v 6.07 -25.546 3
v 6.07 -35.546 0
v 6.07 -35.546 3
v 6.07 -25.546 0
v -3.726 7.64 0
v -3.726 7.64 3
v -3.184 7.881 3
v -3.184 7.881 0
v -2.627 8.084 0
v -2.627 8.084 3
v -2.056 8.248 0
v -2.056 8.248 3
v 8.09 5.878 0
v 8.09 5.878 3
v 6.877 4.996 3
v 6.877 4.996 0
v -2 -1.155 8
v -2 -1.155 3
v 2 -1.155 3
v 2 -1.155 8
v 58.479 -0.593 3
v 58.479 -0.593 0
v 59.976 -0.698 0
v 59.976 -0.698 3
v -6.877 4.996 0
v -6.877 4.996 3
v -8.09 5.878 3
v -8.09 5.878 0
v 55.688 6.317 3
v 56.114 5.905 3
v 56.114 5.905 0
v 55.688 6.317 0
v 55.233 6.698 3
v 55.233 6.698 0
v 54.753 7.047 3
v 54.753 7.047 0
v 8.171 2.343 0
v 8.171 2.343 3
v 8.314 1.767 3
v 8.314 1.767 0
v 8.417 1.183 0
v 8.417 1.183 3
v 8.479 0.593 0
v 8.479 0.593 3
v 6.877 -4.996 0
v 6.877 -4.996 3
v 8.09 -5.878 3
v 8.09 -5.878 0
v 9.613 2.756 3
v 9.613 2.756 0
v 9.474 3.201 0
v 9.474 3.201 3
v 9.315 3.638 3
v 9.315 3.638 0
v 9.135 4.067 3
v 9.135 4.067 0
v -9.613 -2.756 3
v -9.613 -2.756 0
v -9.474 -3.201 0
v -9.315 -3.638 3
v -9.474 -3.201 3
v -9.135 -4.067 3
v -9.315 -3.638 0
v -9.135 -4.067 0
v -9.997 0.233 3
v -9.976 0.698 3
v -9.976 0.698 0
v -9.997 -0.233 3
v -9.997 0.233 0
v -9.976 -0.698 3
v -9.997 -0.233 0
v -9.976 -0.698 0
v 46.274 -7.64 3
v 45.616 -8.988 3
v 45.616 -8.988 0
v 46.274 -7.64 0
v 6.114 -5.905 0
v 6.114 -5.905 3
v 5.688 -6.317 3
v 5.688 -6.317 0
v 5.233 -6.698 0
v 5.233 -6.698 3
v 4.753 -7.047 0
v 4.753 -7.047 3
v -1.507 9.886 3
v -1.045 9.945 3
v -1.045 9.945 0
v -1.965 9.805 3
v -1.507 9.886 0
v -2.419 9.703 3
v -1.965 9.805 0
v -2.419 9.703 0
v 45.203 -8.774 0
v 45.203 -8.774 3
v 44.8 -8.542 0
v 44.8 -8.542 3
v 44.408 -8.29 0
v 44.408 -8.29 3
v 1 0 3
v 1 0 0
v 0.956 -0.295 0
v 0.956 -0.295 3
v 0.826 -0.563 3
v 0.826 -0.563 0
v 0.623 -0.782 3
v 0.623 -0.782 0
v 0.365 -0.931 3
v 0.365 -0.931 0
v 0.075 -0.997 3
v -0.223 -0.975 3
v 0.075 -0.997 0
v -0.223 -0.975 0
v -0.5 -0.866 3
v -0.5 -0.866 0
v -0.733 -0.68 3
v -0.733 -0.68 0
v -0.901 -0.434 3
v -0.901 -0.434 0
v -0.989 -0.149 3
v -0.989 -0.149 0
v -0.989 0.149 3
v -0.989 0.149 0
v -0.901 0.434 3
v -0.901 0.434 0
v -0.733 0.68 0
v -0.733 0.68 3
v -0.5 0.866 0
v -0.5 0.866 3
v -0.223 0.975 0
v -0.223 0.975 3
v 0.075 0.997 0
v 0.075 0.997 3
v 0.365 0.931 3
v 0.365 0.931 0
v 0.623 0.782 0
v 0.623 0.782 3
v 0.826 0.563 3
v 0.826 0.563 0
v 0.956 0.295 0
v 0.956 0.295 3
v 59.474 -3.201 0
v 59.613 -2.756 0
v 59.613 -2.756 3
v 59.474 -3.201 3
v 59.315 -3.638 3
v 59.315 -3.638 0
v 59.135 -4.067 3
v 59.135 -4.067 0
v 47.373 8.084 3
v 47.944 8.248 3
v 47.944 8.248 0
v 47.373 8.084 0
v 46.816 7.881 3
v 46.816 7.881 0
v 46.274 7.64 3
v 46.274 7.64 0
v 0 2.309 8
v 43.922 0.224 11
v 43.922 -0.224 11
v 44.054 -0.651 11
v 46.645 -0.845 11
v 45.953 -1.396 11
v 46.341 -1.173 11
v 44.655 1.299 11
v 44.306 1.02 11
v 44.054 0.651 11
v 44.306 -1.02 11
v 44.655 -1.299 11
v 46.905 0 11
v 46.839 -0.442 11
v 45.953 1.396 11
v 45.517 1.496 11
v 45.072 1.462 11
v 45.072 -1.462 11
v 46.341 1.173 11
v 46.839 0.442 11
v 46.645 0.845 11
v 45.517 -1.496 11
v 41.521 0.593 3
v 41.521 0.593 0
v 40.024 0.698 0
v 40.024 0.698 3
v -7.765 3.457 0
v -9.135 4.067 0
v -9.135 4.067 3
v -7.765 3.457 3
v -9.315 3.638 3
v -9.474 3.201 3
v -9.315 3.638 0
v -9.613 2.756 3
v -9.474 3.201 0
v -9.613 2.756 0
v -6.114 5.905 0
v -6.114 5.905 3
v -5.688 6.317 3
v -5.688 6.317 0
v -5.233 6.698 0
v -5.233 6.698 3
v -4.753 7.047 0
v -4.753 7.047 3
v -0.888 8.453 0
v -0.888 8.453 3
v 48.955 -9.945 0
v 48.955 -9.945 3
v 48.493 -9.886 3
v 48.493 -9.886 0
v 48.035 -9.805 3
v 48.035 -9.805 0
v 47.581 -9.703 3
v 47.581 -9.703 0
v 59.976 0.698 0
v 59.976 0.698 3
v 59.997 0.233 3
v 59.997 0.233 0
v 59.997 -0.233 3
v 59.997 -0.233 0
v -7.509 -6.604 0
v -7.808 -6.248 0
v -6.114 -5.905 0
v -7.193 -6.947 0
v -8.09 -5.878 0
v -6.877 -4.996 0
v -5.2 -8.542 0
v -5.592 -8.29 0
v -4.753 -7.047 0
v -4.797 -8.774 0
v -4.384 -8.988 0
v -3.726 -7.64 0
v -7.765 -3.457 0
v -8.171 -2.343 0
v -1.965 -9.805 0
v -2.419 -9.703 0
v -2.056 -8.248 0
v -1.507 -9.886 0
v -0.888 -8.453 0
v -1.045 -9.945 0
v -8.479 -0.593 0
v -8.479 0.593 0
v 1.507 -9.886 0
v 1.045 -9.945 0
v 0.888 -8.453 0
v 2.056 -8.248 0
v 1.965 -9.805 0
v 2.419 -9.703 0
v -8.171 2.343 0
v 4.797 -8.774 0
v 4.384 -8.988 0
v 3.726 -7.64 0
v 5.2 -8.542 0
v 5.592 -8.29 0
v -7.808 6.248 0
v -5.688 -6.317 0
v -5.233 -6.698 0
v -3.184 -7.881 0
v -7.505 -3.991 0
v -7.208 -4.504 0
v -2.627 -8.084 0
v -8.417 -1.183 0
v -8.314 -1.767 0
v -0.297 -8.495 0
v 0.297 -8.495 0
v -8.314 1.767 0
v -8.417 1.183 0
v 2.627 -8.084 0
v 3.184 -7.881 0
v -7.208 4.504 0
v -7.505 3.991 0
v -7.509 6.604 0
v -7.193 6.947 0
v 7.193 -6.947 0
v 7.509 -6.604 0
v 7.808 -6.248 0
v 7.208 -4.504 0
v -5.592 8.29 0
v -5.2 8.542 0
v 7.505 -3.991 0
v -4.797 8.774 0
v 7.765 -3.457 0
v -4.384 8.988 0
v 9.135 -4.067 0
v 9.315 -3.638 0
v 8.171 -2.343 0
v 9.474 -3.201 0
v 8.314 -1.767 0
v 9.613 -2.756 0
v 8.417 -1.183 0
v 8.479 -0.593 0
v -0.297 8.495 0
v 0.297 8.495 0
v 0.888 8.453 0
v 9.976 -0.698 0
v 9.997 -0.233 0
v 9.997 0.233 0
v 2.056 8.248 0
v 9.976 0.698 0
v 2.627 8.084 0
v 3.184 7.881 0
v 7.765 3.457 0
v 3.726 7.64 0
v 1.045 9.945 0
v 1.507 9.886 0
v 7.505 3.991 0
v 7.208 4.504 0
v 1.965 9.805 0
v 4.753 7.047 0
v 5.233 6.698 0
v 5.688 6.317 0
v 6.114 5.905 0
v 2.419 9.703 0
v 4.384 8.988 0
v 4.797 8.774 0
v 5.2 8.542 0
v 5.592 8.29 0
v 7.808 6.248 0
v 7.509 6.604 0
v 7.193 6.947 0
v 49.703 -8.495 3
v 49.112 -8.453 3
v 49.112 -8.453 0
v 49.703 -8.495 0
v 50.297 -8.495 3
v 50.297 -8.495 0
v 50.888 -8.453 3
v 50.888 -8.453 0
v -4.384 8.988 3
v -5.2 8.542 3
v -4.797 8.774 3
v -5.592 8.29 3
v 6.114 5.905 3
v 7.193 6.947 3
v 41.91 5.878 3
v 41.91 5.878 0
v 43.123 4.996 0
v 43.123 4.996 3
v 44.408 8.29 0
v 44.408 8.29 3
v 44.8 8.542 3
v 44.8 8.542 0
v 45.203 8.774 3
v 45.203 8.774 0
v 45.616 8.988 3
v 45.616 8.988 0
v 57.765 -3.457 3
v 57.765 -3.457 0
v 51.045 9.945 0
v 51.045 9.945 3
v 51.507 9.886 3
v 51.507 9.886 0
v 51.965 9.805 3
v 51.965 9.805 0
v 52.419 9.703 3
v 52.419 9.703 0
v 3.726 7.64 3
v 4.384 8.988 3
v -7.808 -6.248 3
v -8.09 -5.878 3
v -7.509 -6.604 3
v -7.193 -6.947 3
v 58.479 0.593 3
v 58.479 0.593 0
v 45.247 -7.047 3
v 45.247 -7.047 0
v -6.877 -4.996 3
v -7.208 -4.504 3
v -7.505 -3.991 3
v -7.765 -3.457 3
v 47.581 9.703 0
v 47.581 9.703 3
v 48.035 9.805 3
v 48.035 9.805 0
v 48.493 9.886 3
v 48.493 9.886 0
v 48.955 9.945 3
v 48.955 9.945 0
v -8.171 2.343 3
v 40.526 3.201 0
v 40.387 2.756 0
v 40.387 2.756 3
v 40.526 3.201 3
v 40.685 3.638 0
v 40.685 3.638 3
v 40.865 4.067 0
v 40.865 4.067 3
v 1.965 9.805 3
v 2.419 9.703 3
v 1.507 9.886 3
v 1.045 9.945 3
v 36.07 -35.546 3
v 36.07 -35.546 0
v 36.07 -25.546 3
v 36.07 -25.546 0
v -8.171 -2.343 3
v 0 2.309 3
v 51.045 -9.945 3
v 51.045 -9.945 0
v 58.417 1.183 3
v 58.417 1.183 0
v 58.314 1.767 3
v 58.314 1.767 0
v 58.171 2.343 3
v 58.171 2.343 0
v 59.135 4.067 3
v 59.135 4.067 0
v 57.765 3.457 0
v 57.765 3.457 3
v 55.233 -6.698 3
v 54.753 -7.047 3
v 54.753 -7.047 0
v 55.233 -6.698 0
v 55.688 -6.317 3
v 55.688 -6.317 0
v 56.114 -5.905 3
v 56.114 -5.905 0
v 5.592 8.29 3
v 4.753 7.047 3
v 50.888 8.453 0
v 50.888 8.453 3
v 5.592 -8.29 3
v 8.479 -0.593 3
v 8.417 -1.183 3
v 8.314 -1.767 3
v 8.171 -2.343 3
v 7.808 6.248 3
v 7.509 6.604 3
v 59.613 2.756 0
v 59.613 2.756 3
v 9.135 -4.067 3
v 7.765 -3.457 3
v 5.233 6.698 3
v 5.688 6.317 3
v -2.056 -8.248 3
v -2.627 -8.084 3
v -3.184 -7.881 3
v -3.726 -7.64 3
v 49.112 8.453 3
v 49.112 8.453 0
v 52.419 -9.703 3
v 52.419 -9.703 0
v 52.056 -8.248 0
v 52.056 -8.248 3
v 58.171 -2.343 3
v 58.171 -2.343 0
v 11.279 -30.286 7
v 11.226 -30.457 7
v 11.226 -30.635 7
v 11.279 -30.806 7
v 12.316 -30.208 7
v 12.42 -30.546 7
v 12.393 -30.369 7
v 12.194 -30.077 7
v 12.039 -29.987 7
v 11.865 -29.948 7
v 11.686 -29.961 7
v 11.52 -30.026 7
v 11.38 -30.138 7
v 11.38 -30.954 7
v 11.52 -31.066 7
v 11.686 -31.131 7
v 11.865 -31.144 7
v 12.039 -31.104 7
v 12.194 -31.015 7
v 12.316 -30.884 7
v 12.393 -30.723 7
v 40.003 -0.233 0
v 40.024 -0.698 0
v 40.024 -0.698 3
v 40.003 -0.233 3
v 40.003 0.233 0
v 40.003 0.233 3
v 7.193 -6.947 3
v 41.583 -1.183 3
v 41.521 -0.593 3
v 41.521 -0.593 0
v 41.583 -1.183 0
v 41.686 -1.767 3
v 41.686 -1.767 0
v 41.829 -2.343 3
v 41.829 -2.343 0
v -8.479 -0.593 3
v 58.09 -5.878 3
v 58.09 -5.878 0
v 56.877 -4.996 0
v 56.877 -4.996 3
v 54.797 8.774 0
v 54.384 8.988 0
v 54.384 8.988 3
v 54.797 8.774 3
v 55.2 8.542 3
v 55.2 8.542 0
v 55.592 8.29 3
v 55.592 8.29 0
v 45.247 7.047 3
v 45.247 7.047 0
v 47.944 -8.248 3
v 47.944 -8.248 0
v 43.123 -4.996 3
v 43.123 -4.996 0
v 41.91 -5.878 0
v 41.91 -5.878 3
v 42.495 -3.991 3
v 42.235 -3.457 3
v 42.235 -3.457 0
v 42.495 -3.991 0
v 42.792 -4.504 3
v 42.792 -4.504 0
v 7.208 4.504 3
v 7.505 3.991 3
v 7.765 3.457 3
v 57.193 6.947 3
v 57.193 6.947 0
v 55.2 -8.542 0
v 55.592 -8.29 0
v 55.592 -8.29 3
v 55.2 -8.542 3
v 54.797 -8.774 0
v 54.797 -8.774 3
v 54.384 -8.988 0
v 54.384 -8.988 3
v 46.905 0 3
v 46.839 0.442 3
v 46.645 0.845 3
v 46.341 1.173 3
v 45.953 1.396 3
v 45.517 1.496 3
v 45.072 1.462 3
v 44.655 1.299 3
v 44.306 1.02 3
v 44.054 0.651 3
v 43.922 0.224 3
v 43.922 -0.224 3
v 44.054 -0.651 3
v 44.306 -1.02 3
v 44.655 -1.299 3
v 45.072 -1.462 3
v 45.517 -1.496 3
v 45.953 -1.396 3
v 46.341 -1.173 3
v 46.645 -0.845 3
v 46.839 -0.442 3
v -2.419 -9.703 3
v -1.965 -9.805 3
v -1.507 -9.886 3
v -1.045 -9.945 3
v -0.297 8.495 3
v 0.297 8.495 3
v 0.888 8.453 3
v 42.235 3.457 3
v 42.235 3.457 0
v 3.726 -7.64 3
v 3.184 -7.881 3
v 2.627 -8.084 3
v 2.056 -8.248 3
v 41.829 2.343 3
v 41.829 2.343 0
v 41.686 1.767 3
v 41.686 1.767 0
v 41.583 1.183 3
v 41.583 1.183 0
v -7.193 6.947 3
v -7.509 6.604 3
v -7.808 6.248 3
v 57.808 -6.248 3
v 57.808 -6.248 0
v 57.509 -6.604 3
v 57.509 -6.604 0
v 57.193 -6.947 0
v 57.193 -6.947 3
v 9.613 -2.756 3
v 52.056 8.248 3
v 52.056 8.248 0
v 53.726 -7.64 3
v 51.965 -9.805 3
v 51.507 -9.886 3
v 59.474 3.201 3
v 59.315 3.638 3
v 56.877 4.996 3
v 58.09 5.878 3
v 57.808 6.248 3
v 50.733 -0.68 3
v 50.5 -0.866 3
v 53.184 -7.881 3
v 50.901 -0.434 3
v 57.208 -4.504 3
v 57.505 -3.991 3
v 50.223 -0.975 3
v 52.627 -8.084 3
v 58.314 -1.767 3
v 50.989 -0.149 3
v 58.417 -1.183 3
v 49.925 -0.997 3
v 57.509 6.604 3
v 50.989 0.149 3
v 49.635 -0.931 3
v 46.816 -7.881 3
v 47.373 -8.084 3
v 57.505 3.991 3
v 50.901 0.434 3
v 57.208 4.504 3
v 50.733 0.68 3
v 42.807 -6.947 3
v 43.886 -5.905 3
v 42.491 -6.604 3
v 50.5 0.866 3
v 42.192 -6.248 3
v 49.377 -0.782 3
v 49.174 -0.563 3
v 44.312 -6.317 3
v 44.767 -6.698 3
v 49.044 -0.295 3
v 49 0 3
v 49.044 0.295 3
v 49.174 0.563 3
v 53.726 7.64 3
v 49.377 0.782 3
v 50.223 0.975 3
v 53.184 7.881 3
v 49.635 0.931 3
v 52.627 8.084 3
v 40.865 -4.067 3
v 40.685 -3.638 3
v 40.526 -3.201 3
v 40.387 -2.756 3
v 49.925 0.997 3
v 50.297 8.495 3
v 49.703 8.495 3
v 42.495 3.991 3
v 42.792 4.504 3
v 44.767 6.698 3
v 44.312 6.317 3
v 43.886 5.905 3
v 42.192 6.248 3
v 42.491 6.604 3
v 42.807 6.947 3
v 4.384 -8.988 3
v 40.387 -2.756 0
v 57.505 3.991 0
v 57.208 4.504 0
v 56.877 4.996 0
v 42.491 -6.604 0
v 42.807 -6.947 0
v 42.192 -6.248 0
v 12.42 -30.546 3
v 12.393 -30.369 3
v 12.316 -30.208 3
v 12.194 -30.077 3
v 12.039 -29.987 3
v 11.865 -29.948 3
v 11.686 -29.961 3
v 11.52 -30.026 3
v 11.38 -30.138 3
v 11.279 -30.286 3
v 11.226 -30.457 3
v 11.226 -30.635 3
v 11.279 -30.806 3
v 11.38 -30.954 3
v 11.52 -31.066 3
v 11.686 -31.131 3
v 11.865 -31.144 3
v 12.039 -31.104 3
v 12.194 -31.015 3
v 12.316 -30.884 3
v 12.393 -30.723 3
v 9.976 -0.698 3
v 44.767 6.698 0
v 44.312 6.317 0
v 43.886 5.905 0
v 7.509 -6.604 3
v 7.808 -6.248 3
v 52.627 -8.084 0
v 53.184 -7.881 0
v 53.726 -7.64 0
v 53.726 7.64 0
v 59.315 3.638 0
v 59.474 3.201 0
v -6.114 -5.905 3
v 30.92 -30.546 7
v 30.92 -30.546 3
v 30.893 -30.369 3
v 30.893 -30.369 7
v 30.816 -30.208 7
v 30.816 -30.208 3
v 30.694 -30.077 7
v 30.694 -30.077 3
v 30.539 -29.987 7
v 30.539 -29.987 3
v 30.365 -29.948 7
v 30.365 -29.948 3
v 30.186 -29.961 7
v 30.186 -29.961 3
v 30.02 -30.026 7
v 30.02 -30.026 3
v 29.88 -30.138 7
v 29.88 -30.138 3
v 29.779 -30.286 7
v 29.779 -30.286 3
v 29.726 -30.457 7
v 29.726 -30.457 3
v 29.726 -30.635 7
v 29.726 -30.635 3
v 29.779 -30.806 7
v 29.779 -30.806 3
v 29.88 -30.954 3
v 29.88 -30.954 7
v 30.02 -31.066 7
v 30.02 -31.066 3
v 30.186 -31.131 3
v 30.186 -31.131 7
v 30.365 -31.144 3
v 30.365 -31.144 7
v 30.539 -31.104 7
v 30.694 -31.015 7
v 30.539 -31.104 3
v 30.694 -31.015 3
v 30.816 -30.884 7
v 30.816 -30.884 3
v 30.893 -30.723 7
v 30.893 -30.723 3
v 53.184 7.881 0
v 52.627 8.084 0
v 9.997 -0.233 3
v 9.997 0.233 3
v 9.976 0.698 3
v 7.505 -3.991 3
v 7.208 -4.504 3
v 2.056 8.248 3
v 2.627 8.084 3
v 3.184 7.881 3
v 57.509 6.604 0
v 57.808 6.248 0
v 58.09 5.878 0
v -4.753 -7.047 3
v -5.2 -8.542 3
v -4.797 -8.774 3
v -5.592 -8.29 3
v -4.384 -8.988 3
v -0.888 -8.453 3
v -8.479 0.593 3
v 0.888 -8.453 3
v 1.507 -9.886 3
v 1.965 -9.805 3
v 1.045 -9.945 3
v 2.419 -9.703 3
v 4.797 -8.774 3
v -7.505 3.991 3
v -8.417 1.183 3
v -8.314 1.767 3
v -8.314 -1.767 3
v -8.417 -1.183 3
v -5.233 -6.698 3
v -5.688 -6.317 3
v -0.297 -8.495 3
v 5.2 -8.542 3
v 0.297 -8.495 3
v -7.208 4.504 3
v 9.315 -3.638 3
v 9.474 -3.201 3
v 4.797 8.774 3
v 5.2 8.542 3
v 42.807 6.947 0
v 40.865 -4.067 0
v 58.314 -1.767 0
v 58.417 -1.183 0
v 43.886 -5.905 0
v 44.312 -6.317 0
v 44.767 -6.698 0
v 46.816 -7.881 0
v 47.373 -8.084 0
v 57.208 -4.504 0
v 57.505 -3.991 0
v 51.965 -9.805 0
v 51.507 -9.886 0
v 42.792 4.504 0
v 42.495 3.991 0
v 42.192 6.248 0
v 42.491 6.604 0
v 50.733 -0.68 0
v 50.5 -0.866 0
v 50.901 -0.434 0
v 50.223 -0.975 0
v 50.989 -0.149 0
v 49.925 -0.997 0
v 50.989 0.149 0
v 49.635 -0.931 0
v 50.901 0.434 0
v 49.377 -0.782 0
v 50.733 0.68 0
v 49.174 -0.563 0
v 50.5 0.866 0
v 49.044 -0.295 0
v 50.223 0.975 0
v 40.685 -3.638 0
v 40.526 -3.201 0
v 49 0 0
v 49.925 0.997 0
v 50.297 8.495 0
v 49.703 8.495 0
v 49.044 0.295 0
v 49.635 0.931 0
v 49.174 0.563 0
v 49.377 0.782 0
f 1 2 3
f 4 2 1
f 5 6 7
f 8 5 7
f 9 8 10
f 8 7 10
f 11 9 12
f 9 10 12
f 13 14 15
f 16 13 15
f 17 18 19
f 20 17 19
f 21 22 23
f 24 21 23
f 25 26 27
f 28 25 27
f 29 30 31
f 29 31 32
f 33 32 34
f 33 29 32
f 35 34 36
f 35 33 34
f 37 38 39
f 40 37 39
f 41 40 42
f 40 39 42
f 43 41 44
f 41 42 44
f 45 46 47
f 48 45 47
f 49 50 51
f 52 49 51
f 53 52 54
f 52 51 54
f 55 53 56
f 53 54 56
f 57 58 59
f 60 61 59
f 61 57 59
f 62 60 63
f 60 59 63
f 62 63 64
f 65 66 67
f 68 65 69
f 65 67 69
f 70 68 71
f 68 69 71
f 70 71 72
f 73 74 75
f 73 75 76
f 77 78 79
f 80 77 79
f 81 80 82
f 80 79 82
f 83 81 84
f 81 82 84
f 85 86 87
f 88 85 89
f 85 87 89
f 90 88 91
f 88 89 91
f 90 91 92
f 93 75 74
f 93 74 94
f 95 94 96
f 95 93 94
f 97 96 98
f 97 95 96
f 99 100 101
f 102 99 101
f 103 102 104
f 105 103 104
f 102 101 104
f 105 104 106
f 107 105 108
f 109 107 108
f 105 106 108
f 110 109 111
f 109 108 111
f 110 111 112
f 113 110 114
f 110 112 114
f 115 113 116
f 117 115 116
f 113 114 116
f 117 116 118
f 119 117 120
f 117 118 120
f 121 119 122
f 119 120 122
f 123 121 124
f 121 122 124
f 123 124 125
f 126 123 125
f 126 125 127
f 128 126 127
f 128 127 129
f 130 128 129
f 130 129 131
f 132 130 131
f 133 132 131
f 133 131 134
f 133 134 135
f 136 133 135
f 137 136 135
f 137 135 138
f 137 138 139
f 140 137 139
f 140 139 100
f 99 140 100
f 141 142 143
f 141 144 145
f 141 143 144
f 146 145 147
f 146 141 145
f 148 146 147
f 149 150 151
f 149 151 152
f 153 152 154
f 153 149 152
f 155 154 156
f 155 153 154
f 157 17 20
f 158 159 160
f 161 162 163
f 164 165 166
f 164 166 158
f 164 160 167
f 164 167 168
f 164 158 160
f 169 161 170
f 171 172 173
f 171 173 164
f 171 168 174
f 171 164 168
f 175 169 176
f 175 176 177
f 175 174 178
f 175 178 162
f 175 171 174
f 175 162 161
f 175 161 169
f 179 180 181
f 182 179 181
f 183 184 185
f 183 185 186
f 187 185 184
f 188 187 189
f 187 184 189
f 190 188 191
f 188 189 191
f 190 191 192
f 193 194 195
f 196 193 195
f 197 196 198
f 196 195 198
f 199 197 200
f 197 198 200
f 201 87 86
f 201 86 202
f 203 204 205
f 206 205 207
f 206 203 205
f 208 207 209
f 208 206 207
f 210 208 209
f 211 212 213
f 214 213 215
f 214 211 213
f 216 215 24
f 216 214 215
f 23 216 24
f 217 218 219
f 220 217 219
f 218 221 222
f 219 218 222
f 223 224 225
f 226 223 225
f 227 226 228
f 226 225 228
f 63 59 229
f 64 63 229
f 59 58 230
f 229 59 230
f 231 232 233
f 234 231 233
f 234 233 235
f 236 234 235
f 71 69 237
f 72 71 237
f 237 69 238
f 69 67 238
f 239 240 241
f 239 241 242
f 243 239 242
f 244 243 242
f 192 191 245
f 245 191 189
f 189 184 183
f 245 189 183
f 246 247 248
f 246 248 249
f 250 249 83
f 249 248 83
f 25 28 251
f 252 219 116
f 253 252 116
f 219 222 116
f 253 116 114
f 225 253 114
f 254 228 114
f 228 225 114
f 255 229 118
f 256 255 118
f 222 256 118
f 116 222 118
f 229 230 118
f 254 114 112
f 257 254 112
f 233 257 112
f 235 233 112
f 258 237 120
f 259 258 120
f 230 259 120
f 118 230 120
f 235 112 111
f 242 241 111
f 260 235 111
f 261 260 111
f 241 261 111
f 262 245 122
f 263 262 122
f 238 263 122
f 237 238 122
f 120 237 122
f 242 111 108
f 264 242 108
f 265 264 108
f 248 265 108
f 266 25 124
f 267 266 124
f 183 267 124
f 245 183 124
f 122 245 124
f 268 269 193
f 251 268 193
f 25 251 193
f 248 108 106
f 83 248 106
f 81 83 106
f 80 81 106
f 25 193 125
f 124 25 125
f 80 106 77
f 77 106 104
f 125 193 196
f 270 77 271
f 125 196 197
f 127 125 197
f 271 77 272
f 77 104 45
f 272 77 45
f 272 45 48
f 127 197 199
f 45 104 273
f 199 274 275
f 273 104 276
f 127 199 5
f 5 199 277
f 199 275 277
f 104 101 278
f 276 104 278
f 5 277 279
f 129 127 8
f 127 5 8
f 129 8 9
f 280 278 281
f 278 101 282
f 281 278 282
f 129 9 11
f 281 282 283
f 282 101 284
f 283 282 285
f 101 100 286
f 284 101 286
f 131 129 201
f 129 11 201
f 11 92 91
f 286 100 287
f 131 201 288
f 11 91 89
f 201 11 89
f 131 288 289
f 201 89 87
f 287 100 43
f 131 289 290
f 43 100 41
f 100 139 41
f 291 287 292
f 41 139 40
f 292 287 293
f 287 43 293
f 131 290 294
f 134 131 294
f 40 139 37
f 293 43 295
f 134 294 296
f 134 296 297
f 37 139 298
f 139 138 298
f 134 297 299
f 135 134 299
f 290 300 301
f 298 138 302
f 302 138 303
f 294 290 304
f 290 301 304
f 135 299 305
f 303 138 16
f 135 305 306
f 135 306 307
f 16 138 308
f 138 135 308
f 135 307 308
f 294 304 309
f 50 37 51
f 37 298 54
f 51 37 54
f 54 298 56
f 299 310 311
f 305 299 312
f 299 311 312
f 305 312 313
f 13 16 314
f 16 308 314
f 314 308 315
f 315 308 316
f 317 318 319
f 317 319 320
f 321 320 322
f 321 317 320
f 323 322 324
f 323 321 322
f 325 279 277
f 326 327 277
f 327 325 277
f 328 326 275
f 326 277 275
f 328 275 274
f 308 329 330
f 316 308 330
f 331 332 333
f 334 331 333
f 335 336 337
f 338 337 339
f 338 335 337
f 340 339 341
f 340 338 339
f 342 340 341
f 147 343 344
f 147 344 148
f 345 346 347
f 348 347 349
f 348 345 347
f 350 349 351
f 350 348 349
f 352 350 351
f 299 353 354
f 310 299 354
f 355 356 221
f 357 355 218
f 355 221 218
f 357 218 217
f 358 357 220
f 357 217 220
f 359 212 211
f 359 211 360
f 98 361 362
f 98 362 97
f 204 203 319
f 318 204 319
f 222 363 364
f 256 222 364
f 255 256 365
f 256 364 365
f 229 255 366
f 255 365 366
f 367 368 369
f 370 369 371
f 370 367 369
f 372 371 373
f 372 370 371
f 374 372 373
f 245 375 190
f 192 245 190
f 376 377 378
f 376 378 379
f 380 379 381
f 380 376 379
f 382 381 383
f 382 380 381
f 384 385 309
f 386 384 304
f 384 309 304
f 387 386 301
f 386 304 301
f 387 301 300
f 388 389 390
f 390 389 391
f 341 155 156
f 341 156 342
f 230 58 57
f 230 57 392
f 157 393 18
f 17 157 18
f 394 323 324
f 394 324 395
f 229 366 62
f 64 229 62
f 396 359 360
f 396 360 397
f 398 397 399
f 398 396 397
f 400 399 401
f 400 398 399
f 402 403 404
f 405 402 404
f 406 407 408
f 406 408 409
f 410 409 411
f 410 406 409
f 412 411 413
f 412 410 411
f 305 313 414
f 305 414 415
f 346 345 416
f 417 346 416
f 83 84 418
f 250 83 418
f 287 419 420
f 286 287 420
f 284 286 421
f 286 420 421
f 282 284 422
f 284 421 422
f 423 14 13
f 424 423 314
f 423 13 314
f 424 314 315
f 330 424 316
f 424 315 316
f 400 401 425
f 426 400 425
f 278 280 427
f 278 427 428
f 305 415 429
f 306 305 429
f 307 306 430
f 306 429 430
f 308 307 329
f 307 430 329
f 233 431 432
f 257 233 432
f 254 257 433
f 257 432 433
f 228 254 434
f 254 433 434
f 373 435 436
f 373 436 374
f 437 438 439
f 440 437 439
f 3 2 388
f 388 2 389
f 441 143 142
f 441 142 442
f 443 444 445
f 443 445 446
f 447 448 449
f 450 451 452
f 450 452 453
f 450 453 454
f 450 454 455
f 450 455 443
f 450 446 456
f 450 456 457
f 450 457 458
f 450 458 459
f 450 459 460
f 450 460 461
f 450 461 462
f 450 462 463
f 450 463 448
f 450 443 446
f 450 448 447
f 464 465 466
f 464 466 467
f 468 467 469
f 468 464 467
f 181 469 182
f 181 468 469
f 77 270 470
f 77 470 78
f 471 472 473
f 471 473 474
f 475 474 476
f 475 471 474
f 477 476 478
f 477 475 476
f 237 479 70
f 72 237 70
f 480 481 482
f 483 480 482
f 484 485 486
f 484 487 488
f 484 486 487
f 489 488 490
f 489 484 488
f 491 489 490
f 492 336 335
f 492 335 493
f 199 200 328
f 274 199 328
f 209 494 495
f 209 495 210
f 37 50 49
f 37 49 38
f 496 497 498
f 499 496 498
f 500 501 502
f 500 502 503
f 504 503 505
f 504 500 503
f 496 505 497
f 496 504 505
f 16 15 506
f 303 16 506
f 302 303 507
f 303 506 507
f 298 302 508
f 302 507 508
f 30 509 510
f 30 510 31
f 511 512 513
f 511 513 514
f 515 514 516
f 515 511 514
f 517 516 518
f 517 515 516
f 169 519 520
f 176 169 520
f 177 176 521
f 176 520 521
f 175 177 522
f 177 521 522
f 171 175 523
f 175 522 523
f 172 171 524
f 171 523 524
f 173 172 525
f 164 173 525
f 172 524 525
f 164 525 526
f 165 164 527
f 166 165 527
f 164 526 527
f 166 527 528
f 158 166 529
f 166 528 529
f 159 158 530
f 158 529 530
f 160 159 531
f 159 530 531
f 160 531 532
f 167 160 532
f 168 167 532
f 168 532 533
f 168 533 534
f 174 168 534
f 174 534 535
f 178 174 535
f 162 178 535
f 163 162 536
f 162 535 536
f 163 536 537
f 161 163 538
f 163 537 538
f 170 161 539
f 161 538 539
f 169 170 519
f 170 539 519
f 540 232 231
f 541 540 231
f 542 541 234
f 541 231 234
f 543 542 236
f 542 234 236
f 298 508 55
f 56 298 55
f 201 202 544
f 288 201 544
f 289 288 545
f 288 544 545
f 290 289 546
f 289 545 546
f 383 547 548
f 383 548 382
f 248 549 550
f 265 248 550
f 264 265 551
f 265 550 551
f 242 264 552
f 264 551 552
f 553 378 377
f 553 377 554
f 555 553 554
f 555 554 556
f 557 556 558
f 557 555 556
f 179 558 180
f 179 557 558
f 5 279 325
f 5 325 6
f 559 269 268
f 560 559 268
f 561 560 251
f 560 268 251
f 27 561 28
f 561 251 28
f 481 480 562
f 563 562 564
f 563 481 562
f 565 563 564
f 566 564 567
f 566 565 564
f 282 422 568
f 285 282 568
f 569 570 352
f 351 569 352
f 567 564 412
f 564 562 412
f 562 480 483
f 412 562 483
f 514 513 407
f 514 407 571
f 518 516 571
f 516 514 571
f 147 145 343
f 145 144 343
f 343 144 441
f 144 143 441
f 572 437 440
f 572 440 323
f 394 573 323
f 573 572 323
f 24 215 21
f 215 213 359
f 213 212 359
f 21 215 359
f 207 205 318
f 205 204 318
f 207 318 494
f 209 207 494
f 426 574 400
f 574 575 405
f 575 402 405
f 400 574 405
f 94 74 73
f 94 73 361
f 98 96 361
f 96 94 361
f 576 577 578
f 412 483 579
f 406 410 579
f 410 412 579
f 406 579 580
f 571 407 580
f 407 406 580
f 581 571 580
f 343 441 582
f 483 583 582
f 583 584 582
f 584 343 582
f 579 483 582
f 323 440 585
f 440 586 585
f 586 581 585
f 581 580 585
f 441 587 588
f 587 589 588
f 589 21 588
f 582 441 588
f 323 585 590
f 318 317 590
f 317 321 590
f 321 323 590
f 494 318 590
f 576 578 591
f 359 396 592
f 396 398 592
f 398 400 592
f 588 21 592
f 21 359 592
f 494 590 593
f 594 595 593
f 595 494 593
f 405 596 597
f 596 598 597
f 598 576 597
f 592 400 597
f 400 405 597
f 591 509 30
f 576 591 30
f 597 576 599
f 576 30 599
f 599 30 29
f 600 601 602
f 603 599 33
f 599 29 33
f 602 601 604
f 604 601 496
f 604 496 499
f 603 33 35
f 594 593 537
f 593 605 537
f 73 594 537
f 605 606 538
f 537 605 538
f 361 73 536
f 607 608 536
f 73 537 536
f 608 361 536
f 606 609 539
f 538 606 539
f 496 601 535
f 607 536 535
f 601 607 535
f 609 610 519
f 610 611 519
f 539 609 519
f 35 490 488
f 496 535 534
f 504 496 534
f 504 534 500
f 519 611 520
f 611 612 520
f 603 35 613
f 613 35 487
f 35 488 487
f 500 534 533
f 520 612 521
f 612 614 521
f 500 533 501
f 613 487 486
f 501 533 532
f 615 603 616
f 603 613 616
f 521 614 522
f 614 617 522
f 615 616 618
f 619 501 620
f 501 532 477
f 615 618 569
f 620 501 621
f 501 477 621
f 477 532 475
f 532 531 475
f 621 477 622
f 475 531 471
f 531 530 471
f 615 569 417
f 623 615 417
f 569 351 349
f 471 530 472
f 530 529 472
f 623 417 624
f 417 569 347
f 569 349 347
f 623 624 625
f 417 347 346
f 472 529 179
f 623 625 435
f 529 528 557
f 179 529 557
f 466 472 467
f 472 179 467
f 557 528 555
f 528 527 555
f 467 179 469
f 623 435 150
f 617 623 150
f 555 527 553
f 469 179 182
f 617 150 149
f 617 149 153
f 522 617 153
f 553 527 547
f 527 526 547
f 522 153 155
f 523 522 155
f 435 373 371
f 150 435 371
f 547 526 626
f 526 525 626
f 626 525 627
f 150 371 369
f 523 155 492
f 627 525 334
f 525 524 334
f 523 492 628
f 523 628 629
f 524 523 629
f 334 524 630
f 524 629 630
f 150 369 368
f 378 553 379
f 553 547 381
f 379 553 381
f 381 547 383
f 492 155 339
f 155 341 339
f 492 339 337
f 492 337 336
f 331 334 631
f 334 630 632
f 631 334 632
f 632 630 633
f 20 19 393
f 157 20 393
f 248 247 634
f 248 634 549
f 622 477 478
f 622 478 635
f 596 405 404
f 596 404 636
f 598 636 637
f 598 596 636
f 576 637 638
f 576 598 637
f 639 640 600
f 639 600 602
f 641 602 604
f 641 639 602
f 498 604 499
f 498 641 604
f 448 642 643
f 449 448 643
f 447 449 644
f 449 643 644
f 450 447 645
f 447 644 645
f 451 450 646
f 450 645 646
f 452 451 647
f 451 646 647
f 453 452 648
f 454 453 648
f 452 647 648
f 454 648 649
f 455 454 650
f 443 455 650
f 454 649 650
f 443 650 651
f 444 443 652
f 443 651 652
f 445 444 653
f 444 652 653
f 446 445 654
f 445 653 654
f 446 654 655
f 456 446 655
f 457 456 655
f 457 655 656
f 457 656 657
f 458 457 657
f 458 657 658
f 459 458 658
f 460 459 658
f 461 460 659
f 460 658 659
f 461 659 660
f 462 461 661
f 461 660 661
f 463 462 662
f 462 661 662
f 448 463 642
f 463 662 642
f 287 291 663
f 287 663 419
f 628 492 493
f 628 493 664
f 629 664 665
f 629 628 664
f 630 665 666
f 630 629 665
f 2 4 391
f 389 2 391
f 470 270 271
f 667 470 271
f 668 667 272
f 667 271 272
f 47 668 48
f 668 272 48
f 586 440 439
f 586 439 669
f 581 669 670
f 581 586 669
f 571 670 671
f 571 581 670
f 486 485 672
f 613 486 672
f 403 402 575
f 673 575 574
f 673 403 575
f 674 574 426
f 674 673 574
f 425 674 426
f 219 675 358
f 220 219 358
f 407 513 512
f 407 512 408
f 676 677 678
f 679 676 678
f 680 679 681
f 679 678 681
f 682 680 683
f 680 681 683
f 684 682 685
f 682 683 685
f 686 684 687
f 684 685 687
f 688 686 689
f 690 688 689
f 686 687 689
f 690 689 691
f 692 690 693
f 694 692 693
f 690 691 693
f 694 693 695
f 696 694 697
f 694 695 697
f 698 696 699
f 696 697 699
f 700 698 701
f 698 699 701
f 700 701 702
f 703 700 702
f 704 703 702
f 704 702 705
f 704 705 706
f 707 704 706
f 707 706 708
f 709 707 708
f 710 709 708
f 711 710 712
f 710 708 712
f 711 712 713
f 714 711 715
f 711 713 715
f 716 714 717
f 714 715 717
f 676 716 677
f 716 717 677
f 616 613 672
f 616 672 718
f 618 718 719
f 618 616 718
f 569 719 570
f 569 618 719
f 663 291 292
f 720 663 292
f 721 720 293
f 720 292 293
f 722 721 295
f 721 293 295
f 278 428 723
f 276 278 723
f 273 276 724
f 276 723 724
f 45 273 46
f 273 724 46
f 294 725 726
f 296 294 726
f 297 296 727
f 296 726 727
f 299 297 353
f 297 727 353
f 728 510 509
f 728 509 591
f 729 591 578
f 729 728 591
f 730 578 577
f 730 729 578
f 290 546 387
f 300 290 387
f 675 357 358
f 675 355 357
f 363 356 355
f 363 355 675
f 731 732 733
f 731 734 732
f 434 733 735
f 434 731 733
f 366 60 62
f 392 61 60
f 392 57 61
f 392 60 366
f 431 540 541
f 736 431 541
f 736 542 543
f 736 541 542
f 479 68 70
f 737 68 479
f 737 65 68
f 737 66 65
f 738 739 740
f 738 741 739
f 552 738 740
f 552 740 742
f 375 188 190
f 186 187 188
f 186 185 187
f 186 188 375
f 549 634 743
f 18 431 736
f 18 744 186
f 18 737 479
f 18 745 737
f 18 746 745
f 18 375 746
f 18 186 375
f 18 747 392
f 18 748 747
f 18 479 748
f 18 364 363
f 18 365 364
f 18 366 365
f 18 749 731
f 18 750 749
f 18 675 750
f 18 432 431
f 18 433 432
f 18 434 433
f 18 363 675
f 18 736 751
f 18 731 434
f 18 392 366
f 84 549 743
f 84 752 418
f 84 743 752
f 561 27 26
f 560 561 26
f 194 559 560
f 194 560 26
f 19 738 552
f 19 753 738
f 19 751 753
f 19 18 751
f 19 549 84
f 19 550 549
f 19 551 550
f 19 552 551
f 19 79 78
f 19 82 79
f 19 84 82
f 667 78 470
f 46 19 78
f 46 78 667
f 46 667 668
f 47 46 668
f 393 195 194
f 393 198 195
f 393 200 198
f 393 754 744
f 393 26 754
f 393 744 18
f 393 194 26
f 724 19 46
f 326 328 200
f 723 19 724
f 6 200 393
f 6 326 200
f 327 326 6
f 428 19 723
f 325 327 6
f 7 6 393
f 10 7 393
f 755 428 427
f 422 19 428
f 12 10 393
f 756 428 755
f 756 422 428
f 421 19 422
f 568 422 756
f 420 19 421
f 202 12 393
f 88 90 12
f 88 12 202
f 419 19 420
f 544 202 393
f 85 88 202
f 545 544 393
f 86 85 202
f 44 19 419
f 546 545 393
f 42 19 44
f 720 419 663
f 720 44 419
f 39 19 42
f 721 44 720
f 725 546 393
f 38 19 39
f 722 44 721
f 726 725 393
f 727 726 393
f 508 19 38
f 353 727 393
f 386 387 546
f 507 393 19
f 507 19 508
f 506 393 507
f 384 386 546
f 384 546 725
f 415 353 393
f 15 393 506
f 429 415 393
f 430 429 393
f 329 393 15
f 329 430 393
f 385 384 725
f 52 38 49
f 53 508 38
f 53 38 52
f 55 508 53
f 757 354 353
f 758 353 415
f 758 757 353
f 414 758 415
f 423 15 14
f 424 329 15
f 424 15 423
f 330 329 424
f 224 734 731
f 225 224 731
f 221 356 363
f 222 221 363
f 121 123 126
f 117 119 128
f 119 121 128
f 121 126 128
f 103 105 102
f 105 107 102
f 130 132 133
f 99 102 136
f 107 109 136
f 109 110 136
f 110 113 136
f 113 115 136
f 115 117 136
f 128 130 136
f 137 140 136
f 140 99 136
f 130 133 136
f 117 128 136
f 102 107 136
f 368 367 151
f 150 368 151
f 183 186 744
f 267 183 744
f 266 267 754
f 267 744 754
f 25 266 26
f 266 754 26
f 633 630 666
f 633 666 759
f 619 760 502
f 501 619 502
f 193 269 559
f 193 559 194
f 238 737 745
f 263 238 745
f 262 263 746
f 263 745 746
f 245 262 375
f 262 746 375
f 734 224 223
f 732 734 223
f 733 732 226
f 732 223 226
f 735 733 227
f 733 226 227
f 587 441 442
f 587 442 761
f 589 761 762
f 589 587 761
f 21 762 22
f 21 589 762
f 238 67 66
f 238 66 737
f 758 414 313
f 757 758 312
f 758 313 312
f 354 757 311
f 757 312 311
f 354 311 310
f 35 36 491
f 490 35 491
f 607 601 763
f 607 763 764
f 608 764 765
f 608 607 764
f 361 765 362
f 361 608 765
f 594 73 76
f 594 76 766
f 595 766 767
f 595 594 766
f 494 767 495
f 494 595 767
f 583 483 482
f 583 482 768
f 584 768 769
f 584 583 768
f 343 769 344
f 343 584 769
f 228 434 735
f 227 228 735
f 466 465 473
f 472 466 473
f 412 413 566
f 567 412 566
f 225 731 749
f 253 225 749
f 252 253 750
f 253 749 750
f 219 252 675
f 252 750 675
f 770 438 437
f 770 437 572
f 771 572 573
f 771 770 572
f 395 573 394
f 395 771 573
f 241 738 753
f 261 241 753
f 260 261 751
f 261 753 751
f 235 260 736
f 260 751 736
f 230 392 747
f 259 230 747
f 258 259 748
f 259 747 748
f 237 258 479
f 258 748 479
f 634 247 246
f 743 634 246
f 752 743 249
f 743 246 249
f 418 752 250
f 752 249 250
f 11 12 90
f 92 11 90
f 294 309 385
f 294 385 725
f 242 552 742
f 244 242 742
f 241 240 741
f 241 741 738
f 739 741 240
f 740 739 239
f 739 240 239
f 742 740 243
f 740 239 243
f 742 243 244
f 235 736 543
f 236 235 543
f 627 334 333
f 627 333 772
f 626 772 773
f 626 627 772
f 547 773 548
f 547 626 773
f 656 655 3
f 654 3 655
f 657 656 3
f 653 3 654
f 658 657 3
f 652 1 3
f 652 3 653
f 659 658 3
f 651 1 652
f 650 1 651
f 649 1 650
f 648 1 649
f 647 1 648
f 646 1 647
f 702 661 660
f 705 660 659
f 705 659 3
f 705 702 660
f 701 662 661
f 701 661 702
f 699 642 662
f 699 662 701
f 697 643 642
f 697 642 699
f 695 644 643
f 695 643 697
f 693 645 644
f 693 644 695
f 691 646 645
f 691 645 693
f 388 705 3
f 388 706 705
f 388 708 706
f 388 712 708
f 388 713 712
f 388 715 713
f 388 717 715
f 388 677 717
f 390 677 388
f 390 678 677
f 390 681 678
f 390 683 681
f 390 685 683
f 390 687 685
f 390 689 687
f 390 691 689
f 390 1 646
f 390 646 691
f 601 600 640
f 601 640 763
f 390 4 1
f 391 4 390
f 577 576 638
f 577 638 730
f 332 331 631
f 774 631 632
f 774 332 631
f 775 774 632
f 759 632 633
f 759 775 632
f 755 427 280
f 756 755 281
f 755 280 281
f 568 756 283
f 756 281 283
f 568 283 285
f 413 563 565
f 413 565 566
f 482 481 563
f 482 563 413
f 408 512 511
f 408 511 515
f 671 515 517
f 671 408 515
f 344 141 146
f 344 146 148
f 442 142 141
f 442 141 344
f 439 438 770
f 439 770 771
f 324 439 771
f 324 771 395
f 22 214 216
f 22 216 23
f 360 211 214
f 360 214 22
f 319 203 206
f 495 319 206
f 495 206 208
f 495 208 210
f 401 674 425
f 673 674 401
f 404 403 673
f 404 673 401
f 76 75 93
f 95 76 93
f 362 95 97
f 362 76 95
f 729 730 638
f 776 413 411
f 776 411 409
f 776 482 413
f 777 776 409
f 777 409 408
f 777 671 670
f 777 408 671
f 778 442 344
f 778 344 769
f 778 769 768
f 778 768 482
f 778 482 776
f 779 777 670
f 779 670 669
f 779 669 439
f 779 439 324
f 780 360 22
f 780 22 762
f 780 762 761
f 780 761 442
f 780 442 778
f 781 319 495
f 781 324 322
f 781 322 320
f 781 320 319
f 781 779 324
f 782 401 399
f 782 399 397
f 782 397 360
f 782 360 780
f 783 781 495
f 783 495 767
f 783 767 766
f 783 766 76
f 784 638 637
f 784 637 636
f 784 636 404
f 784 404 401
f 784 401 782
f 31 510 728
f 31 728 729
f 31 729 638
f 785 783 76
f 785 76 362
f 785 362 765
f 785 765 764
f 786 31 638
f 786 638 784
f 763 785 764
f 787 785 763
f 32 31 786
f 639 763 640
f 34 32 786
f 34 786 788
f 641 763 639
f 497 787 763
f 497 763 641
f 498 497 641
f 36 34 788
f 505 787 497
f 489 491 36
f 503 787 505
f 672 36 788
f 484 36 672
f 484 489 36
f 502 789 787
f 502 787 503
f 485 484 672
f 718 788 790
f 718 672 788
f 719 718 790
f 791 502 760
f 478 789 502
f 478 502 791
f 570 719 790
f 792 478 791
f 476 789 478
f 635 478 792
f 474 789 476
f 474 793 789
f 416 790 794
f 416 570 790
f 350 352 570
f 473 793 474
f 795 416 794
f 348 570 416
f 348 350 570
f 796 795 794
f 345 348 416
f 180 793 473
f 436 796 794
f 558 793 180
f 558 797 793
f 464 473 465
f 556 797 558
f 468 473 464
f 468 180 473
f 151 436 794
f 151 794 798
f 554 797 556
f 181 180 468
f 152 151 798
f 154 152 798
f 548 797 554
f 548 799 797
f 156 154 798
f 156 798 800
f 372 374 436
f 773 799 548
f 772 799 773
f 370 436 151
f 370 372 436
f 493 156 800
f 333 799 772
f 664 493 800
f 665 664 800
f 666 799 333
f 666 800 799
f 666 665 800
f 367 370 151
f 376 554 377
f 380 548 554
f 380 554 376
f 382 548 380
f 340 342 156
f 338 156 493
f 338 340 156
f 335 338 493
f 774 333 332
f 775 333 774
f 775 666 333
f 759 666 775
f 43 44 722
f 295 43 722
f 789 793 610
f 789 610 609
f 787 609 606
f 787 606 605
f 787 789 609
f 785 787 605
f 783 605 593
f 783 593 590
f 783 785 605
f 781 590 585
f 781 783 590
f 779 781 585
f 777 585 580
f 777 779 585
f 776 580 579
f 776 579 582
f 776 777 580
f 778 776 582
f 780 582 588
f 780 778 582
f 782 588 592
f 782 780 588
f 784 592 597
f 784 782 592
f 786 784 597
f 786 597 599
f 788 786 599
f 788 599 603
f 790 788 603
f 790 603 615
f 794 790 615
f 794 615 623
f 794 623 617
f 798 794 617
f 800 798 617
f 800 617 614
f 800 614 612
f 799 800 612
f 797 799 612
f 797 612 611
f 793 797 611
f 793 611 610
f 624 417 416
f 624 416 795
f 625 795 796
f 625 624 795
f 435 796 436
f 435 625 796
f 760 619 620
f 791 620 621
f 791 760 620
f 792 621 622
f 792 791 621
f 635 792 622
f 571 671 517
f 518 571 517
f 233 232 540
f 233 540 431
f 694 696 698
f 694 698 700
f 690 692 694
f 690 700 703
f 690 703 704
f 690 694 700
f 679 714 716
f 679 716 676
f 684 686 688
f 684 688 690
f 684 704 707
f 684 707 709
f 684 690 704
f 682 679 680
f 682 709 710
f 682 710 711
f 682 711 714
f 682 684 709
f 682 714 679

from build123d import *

# Parameters (mm, degrees)
F0_R      = 10
F1_DEPTH  = 3
F3_DEPTH  = 3.001
F4_COUNT  = 18
F4_ANGLE  = 340
F7_R      = 1
F8_DEPTH  = 4
F10_DEPTH = 5
F11_R     = 1.5
F12_DEPTH = 8
F13_W     = 30
F13_H     = 10
F14_DEPTH = 3
F15_R     = 0.6
F16_DEPTH = 4


with BuildPart() as f1:
    # F0 (on Top) → F1 (new body)
    with BuildSketch(Plane.XY):
        Circle(F0_R)
    extrude(amount=F1_DEPTH)

    # F2 (on face) → F3 (cut, through all)
    with BuildSketch(Plane.XY.offset(3)):
        with BuildLine():
            ThreePointArc((-0.8884919378, 8.4534361106), (0, 8.5), (0.8884919378, 8.4534361106))
            Line((0.8884919378, 8.4534361106), (1.0452846327, 9.9452189537))
            ThreePointArc((1.0452846327, 9.9452189537), (0, 10), (-1.0452846327, 9.9452189537))
            Line((-1.0452846327, 9.9452189537), (-0.8884919378, 8.4534361106))
        make_face()
    f3 = extrude(amount=-F3_DEPTH, mode=Mode.SUBTRACT)

    # F4: F3 ×18 about axis
    f4_axis = Axis((0, 0, 0), (0, 0, -1))
    for i in range(1, F4_COUNT):
        add(f3.rotate(f4_axis, i * F4_ANGLE / (F4_COUNT - 1)), mode=Mode.SUBTRACT)

    # F7 (on face) → F8 (cut)
    with BuildSketch(Plane(origin=(0, 0, 0), x_dir=(1, 0, 0), z_dir=(0, 0, -1))):
        Circle(F7_R)
    extrude(amount=-F8_DEPTH, mode=Mode.SUBTRACT)


with BuildPart() as f9_1:
    # F9: instance of F1
    add(f1.part.mirror(Plane.YZ.offset(25)))

    # F11 (on face) → F12 (join)
    with BuildSketch(Plane.XY.offset(3)):
        with Locations((45.4053878784, 0)):
            Circle(F11_R)
    extrude(amount=F12_DEPTH)


with BuildPart() as f1_1:
    add(f1.part)

    # F6 (on face) → F10 (join)
    with BuildSketch(Plane.XY.offset(3)):
        Polygon((2, -1.1547005384), (0, 2.3094010768), (-2, -1.1547005384), align=None)
    extrude(amount=F10_DEPTH)


with BuildPart() as f14:
    # F13 (on Top) → F14 (new body)
    with BuildSketch(Plane.XY):
        with Locations((21.0697623773, -30.5459368974)):
            Rectangle(F13_W, F13_H)
    extrude(amount=F14_DEPTH)

    # F15 (on face) → F16 (join)
    with BuildSketch(Plane.XY.offset(3)):
        with Locations((11.8197623773, -30.5459368974)):
            Circle(F15_R)
        with Locations((30.3197623773, -30.5459368974)):
            Circle(F15_R)
    extrude(amount=F16_DEPTH)


solid = Compound([f9_1.part, f1_1.part, f14.part])
